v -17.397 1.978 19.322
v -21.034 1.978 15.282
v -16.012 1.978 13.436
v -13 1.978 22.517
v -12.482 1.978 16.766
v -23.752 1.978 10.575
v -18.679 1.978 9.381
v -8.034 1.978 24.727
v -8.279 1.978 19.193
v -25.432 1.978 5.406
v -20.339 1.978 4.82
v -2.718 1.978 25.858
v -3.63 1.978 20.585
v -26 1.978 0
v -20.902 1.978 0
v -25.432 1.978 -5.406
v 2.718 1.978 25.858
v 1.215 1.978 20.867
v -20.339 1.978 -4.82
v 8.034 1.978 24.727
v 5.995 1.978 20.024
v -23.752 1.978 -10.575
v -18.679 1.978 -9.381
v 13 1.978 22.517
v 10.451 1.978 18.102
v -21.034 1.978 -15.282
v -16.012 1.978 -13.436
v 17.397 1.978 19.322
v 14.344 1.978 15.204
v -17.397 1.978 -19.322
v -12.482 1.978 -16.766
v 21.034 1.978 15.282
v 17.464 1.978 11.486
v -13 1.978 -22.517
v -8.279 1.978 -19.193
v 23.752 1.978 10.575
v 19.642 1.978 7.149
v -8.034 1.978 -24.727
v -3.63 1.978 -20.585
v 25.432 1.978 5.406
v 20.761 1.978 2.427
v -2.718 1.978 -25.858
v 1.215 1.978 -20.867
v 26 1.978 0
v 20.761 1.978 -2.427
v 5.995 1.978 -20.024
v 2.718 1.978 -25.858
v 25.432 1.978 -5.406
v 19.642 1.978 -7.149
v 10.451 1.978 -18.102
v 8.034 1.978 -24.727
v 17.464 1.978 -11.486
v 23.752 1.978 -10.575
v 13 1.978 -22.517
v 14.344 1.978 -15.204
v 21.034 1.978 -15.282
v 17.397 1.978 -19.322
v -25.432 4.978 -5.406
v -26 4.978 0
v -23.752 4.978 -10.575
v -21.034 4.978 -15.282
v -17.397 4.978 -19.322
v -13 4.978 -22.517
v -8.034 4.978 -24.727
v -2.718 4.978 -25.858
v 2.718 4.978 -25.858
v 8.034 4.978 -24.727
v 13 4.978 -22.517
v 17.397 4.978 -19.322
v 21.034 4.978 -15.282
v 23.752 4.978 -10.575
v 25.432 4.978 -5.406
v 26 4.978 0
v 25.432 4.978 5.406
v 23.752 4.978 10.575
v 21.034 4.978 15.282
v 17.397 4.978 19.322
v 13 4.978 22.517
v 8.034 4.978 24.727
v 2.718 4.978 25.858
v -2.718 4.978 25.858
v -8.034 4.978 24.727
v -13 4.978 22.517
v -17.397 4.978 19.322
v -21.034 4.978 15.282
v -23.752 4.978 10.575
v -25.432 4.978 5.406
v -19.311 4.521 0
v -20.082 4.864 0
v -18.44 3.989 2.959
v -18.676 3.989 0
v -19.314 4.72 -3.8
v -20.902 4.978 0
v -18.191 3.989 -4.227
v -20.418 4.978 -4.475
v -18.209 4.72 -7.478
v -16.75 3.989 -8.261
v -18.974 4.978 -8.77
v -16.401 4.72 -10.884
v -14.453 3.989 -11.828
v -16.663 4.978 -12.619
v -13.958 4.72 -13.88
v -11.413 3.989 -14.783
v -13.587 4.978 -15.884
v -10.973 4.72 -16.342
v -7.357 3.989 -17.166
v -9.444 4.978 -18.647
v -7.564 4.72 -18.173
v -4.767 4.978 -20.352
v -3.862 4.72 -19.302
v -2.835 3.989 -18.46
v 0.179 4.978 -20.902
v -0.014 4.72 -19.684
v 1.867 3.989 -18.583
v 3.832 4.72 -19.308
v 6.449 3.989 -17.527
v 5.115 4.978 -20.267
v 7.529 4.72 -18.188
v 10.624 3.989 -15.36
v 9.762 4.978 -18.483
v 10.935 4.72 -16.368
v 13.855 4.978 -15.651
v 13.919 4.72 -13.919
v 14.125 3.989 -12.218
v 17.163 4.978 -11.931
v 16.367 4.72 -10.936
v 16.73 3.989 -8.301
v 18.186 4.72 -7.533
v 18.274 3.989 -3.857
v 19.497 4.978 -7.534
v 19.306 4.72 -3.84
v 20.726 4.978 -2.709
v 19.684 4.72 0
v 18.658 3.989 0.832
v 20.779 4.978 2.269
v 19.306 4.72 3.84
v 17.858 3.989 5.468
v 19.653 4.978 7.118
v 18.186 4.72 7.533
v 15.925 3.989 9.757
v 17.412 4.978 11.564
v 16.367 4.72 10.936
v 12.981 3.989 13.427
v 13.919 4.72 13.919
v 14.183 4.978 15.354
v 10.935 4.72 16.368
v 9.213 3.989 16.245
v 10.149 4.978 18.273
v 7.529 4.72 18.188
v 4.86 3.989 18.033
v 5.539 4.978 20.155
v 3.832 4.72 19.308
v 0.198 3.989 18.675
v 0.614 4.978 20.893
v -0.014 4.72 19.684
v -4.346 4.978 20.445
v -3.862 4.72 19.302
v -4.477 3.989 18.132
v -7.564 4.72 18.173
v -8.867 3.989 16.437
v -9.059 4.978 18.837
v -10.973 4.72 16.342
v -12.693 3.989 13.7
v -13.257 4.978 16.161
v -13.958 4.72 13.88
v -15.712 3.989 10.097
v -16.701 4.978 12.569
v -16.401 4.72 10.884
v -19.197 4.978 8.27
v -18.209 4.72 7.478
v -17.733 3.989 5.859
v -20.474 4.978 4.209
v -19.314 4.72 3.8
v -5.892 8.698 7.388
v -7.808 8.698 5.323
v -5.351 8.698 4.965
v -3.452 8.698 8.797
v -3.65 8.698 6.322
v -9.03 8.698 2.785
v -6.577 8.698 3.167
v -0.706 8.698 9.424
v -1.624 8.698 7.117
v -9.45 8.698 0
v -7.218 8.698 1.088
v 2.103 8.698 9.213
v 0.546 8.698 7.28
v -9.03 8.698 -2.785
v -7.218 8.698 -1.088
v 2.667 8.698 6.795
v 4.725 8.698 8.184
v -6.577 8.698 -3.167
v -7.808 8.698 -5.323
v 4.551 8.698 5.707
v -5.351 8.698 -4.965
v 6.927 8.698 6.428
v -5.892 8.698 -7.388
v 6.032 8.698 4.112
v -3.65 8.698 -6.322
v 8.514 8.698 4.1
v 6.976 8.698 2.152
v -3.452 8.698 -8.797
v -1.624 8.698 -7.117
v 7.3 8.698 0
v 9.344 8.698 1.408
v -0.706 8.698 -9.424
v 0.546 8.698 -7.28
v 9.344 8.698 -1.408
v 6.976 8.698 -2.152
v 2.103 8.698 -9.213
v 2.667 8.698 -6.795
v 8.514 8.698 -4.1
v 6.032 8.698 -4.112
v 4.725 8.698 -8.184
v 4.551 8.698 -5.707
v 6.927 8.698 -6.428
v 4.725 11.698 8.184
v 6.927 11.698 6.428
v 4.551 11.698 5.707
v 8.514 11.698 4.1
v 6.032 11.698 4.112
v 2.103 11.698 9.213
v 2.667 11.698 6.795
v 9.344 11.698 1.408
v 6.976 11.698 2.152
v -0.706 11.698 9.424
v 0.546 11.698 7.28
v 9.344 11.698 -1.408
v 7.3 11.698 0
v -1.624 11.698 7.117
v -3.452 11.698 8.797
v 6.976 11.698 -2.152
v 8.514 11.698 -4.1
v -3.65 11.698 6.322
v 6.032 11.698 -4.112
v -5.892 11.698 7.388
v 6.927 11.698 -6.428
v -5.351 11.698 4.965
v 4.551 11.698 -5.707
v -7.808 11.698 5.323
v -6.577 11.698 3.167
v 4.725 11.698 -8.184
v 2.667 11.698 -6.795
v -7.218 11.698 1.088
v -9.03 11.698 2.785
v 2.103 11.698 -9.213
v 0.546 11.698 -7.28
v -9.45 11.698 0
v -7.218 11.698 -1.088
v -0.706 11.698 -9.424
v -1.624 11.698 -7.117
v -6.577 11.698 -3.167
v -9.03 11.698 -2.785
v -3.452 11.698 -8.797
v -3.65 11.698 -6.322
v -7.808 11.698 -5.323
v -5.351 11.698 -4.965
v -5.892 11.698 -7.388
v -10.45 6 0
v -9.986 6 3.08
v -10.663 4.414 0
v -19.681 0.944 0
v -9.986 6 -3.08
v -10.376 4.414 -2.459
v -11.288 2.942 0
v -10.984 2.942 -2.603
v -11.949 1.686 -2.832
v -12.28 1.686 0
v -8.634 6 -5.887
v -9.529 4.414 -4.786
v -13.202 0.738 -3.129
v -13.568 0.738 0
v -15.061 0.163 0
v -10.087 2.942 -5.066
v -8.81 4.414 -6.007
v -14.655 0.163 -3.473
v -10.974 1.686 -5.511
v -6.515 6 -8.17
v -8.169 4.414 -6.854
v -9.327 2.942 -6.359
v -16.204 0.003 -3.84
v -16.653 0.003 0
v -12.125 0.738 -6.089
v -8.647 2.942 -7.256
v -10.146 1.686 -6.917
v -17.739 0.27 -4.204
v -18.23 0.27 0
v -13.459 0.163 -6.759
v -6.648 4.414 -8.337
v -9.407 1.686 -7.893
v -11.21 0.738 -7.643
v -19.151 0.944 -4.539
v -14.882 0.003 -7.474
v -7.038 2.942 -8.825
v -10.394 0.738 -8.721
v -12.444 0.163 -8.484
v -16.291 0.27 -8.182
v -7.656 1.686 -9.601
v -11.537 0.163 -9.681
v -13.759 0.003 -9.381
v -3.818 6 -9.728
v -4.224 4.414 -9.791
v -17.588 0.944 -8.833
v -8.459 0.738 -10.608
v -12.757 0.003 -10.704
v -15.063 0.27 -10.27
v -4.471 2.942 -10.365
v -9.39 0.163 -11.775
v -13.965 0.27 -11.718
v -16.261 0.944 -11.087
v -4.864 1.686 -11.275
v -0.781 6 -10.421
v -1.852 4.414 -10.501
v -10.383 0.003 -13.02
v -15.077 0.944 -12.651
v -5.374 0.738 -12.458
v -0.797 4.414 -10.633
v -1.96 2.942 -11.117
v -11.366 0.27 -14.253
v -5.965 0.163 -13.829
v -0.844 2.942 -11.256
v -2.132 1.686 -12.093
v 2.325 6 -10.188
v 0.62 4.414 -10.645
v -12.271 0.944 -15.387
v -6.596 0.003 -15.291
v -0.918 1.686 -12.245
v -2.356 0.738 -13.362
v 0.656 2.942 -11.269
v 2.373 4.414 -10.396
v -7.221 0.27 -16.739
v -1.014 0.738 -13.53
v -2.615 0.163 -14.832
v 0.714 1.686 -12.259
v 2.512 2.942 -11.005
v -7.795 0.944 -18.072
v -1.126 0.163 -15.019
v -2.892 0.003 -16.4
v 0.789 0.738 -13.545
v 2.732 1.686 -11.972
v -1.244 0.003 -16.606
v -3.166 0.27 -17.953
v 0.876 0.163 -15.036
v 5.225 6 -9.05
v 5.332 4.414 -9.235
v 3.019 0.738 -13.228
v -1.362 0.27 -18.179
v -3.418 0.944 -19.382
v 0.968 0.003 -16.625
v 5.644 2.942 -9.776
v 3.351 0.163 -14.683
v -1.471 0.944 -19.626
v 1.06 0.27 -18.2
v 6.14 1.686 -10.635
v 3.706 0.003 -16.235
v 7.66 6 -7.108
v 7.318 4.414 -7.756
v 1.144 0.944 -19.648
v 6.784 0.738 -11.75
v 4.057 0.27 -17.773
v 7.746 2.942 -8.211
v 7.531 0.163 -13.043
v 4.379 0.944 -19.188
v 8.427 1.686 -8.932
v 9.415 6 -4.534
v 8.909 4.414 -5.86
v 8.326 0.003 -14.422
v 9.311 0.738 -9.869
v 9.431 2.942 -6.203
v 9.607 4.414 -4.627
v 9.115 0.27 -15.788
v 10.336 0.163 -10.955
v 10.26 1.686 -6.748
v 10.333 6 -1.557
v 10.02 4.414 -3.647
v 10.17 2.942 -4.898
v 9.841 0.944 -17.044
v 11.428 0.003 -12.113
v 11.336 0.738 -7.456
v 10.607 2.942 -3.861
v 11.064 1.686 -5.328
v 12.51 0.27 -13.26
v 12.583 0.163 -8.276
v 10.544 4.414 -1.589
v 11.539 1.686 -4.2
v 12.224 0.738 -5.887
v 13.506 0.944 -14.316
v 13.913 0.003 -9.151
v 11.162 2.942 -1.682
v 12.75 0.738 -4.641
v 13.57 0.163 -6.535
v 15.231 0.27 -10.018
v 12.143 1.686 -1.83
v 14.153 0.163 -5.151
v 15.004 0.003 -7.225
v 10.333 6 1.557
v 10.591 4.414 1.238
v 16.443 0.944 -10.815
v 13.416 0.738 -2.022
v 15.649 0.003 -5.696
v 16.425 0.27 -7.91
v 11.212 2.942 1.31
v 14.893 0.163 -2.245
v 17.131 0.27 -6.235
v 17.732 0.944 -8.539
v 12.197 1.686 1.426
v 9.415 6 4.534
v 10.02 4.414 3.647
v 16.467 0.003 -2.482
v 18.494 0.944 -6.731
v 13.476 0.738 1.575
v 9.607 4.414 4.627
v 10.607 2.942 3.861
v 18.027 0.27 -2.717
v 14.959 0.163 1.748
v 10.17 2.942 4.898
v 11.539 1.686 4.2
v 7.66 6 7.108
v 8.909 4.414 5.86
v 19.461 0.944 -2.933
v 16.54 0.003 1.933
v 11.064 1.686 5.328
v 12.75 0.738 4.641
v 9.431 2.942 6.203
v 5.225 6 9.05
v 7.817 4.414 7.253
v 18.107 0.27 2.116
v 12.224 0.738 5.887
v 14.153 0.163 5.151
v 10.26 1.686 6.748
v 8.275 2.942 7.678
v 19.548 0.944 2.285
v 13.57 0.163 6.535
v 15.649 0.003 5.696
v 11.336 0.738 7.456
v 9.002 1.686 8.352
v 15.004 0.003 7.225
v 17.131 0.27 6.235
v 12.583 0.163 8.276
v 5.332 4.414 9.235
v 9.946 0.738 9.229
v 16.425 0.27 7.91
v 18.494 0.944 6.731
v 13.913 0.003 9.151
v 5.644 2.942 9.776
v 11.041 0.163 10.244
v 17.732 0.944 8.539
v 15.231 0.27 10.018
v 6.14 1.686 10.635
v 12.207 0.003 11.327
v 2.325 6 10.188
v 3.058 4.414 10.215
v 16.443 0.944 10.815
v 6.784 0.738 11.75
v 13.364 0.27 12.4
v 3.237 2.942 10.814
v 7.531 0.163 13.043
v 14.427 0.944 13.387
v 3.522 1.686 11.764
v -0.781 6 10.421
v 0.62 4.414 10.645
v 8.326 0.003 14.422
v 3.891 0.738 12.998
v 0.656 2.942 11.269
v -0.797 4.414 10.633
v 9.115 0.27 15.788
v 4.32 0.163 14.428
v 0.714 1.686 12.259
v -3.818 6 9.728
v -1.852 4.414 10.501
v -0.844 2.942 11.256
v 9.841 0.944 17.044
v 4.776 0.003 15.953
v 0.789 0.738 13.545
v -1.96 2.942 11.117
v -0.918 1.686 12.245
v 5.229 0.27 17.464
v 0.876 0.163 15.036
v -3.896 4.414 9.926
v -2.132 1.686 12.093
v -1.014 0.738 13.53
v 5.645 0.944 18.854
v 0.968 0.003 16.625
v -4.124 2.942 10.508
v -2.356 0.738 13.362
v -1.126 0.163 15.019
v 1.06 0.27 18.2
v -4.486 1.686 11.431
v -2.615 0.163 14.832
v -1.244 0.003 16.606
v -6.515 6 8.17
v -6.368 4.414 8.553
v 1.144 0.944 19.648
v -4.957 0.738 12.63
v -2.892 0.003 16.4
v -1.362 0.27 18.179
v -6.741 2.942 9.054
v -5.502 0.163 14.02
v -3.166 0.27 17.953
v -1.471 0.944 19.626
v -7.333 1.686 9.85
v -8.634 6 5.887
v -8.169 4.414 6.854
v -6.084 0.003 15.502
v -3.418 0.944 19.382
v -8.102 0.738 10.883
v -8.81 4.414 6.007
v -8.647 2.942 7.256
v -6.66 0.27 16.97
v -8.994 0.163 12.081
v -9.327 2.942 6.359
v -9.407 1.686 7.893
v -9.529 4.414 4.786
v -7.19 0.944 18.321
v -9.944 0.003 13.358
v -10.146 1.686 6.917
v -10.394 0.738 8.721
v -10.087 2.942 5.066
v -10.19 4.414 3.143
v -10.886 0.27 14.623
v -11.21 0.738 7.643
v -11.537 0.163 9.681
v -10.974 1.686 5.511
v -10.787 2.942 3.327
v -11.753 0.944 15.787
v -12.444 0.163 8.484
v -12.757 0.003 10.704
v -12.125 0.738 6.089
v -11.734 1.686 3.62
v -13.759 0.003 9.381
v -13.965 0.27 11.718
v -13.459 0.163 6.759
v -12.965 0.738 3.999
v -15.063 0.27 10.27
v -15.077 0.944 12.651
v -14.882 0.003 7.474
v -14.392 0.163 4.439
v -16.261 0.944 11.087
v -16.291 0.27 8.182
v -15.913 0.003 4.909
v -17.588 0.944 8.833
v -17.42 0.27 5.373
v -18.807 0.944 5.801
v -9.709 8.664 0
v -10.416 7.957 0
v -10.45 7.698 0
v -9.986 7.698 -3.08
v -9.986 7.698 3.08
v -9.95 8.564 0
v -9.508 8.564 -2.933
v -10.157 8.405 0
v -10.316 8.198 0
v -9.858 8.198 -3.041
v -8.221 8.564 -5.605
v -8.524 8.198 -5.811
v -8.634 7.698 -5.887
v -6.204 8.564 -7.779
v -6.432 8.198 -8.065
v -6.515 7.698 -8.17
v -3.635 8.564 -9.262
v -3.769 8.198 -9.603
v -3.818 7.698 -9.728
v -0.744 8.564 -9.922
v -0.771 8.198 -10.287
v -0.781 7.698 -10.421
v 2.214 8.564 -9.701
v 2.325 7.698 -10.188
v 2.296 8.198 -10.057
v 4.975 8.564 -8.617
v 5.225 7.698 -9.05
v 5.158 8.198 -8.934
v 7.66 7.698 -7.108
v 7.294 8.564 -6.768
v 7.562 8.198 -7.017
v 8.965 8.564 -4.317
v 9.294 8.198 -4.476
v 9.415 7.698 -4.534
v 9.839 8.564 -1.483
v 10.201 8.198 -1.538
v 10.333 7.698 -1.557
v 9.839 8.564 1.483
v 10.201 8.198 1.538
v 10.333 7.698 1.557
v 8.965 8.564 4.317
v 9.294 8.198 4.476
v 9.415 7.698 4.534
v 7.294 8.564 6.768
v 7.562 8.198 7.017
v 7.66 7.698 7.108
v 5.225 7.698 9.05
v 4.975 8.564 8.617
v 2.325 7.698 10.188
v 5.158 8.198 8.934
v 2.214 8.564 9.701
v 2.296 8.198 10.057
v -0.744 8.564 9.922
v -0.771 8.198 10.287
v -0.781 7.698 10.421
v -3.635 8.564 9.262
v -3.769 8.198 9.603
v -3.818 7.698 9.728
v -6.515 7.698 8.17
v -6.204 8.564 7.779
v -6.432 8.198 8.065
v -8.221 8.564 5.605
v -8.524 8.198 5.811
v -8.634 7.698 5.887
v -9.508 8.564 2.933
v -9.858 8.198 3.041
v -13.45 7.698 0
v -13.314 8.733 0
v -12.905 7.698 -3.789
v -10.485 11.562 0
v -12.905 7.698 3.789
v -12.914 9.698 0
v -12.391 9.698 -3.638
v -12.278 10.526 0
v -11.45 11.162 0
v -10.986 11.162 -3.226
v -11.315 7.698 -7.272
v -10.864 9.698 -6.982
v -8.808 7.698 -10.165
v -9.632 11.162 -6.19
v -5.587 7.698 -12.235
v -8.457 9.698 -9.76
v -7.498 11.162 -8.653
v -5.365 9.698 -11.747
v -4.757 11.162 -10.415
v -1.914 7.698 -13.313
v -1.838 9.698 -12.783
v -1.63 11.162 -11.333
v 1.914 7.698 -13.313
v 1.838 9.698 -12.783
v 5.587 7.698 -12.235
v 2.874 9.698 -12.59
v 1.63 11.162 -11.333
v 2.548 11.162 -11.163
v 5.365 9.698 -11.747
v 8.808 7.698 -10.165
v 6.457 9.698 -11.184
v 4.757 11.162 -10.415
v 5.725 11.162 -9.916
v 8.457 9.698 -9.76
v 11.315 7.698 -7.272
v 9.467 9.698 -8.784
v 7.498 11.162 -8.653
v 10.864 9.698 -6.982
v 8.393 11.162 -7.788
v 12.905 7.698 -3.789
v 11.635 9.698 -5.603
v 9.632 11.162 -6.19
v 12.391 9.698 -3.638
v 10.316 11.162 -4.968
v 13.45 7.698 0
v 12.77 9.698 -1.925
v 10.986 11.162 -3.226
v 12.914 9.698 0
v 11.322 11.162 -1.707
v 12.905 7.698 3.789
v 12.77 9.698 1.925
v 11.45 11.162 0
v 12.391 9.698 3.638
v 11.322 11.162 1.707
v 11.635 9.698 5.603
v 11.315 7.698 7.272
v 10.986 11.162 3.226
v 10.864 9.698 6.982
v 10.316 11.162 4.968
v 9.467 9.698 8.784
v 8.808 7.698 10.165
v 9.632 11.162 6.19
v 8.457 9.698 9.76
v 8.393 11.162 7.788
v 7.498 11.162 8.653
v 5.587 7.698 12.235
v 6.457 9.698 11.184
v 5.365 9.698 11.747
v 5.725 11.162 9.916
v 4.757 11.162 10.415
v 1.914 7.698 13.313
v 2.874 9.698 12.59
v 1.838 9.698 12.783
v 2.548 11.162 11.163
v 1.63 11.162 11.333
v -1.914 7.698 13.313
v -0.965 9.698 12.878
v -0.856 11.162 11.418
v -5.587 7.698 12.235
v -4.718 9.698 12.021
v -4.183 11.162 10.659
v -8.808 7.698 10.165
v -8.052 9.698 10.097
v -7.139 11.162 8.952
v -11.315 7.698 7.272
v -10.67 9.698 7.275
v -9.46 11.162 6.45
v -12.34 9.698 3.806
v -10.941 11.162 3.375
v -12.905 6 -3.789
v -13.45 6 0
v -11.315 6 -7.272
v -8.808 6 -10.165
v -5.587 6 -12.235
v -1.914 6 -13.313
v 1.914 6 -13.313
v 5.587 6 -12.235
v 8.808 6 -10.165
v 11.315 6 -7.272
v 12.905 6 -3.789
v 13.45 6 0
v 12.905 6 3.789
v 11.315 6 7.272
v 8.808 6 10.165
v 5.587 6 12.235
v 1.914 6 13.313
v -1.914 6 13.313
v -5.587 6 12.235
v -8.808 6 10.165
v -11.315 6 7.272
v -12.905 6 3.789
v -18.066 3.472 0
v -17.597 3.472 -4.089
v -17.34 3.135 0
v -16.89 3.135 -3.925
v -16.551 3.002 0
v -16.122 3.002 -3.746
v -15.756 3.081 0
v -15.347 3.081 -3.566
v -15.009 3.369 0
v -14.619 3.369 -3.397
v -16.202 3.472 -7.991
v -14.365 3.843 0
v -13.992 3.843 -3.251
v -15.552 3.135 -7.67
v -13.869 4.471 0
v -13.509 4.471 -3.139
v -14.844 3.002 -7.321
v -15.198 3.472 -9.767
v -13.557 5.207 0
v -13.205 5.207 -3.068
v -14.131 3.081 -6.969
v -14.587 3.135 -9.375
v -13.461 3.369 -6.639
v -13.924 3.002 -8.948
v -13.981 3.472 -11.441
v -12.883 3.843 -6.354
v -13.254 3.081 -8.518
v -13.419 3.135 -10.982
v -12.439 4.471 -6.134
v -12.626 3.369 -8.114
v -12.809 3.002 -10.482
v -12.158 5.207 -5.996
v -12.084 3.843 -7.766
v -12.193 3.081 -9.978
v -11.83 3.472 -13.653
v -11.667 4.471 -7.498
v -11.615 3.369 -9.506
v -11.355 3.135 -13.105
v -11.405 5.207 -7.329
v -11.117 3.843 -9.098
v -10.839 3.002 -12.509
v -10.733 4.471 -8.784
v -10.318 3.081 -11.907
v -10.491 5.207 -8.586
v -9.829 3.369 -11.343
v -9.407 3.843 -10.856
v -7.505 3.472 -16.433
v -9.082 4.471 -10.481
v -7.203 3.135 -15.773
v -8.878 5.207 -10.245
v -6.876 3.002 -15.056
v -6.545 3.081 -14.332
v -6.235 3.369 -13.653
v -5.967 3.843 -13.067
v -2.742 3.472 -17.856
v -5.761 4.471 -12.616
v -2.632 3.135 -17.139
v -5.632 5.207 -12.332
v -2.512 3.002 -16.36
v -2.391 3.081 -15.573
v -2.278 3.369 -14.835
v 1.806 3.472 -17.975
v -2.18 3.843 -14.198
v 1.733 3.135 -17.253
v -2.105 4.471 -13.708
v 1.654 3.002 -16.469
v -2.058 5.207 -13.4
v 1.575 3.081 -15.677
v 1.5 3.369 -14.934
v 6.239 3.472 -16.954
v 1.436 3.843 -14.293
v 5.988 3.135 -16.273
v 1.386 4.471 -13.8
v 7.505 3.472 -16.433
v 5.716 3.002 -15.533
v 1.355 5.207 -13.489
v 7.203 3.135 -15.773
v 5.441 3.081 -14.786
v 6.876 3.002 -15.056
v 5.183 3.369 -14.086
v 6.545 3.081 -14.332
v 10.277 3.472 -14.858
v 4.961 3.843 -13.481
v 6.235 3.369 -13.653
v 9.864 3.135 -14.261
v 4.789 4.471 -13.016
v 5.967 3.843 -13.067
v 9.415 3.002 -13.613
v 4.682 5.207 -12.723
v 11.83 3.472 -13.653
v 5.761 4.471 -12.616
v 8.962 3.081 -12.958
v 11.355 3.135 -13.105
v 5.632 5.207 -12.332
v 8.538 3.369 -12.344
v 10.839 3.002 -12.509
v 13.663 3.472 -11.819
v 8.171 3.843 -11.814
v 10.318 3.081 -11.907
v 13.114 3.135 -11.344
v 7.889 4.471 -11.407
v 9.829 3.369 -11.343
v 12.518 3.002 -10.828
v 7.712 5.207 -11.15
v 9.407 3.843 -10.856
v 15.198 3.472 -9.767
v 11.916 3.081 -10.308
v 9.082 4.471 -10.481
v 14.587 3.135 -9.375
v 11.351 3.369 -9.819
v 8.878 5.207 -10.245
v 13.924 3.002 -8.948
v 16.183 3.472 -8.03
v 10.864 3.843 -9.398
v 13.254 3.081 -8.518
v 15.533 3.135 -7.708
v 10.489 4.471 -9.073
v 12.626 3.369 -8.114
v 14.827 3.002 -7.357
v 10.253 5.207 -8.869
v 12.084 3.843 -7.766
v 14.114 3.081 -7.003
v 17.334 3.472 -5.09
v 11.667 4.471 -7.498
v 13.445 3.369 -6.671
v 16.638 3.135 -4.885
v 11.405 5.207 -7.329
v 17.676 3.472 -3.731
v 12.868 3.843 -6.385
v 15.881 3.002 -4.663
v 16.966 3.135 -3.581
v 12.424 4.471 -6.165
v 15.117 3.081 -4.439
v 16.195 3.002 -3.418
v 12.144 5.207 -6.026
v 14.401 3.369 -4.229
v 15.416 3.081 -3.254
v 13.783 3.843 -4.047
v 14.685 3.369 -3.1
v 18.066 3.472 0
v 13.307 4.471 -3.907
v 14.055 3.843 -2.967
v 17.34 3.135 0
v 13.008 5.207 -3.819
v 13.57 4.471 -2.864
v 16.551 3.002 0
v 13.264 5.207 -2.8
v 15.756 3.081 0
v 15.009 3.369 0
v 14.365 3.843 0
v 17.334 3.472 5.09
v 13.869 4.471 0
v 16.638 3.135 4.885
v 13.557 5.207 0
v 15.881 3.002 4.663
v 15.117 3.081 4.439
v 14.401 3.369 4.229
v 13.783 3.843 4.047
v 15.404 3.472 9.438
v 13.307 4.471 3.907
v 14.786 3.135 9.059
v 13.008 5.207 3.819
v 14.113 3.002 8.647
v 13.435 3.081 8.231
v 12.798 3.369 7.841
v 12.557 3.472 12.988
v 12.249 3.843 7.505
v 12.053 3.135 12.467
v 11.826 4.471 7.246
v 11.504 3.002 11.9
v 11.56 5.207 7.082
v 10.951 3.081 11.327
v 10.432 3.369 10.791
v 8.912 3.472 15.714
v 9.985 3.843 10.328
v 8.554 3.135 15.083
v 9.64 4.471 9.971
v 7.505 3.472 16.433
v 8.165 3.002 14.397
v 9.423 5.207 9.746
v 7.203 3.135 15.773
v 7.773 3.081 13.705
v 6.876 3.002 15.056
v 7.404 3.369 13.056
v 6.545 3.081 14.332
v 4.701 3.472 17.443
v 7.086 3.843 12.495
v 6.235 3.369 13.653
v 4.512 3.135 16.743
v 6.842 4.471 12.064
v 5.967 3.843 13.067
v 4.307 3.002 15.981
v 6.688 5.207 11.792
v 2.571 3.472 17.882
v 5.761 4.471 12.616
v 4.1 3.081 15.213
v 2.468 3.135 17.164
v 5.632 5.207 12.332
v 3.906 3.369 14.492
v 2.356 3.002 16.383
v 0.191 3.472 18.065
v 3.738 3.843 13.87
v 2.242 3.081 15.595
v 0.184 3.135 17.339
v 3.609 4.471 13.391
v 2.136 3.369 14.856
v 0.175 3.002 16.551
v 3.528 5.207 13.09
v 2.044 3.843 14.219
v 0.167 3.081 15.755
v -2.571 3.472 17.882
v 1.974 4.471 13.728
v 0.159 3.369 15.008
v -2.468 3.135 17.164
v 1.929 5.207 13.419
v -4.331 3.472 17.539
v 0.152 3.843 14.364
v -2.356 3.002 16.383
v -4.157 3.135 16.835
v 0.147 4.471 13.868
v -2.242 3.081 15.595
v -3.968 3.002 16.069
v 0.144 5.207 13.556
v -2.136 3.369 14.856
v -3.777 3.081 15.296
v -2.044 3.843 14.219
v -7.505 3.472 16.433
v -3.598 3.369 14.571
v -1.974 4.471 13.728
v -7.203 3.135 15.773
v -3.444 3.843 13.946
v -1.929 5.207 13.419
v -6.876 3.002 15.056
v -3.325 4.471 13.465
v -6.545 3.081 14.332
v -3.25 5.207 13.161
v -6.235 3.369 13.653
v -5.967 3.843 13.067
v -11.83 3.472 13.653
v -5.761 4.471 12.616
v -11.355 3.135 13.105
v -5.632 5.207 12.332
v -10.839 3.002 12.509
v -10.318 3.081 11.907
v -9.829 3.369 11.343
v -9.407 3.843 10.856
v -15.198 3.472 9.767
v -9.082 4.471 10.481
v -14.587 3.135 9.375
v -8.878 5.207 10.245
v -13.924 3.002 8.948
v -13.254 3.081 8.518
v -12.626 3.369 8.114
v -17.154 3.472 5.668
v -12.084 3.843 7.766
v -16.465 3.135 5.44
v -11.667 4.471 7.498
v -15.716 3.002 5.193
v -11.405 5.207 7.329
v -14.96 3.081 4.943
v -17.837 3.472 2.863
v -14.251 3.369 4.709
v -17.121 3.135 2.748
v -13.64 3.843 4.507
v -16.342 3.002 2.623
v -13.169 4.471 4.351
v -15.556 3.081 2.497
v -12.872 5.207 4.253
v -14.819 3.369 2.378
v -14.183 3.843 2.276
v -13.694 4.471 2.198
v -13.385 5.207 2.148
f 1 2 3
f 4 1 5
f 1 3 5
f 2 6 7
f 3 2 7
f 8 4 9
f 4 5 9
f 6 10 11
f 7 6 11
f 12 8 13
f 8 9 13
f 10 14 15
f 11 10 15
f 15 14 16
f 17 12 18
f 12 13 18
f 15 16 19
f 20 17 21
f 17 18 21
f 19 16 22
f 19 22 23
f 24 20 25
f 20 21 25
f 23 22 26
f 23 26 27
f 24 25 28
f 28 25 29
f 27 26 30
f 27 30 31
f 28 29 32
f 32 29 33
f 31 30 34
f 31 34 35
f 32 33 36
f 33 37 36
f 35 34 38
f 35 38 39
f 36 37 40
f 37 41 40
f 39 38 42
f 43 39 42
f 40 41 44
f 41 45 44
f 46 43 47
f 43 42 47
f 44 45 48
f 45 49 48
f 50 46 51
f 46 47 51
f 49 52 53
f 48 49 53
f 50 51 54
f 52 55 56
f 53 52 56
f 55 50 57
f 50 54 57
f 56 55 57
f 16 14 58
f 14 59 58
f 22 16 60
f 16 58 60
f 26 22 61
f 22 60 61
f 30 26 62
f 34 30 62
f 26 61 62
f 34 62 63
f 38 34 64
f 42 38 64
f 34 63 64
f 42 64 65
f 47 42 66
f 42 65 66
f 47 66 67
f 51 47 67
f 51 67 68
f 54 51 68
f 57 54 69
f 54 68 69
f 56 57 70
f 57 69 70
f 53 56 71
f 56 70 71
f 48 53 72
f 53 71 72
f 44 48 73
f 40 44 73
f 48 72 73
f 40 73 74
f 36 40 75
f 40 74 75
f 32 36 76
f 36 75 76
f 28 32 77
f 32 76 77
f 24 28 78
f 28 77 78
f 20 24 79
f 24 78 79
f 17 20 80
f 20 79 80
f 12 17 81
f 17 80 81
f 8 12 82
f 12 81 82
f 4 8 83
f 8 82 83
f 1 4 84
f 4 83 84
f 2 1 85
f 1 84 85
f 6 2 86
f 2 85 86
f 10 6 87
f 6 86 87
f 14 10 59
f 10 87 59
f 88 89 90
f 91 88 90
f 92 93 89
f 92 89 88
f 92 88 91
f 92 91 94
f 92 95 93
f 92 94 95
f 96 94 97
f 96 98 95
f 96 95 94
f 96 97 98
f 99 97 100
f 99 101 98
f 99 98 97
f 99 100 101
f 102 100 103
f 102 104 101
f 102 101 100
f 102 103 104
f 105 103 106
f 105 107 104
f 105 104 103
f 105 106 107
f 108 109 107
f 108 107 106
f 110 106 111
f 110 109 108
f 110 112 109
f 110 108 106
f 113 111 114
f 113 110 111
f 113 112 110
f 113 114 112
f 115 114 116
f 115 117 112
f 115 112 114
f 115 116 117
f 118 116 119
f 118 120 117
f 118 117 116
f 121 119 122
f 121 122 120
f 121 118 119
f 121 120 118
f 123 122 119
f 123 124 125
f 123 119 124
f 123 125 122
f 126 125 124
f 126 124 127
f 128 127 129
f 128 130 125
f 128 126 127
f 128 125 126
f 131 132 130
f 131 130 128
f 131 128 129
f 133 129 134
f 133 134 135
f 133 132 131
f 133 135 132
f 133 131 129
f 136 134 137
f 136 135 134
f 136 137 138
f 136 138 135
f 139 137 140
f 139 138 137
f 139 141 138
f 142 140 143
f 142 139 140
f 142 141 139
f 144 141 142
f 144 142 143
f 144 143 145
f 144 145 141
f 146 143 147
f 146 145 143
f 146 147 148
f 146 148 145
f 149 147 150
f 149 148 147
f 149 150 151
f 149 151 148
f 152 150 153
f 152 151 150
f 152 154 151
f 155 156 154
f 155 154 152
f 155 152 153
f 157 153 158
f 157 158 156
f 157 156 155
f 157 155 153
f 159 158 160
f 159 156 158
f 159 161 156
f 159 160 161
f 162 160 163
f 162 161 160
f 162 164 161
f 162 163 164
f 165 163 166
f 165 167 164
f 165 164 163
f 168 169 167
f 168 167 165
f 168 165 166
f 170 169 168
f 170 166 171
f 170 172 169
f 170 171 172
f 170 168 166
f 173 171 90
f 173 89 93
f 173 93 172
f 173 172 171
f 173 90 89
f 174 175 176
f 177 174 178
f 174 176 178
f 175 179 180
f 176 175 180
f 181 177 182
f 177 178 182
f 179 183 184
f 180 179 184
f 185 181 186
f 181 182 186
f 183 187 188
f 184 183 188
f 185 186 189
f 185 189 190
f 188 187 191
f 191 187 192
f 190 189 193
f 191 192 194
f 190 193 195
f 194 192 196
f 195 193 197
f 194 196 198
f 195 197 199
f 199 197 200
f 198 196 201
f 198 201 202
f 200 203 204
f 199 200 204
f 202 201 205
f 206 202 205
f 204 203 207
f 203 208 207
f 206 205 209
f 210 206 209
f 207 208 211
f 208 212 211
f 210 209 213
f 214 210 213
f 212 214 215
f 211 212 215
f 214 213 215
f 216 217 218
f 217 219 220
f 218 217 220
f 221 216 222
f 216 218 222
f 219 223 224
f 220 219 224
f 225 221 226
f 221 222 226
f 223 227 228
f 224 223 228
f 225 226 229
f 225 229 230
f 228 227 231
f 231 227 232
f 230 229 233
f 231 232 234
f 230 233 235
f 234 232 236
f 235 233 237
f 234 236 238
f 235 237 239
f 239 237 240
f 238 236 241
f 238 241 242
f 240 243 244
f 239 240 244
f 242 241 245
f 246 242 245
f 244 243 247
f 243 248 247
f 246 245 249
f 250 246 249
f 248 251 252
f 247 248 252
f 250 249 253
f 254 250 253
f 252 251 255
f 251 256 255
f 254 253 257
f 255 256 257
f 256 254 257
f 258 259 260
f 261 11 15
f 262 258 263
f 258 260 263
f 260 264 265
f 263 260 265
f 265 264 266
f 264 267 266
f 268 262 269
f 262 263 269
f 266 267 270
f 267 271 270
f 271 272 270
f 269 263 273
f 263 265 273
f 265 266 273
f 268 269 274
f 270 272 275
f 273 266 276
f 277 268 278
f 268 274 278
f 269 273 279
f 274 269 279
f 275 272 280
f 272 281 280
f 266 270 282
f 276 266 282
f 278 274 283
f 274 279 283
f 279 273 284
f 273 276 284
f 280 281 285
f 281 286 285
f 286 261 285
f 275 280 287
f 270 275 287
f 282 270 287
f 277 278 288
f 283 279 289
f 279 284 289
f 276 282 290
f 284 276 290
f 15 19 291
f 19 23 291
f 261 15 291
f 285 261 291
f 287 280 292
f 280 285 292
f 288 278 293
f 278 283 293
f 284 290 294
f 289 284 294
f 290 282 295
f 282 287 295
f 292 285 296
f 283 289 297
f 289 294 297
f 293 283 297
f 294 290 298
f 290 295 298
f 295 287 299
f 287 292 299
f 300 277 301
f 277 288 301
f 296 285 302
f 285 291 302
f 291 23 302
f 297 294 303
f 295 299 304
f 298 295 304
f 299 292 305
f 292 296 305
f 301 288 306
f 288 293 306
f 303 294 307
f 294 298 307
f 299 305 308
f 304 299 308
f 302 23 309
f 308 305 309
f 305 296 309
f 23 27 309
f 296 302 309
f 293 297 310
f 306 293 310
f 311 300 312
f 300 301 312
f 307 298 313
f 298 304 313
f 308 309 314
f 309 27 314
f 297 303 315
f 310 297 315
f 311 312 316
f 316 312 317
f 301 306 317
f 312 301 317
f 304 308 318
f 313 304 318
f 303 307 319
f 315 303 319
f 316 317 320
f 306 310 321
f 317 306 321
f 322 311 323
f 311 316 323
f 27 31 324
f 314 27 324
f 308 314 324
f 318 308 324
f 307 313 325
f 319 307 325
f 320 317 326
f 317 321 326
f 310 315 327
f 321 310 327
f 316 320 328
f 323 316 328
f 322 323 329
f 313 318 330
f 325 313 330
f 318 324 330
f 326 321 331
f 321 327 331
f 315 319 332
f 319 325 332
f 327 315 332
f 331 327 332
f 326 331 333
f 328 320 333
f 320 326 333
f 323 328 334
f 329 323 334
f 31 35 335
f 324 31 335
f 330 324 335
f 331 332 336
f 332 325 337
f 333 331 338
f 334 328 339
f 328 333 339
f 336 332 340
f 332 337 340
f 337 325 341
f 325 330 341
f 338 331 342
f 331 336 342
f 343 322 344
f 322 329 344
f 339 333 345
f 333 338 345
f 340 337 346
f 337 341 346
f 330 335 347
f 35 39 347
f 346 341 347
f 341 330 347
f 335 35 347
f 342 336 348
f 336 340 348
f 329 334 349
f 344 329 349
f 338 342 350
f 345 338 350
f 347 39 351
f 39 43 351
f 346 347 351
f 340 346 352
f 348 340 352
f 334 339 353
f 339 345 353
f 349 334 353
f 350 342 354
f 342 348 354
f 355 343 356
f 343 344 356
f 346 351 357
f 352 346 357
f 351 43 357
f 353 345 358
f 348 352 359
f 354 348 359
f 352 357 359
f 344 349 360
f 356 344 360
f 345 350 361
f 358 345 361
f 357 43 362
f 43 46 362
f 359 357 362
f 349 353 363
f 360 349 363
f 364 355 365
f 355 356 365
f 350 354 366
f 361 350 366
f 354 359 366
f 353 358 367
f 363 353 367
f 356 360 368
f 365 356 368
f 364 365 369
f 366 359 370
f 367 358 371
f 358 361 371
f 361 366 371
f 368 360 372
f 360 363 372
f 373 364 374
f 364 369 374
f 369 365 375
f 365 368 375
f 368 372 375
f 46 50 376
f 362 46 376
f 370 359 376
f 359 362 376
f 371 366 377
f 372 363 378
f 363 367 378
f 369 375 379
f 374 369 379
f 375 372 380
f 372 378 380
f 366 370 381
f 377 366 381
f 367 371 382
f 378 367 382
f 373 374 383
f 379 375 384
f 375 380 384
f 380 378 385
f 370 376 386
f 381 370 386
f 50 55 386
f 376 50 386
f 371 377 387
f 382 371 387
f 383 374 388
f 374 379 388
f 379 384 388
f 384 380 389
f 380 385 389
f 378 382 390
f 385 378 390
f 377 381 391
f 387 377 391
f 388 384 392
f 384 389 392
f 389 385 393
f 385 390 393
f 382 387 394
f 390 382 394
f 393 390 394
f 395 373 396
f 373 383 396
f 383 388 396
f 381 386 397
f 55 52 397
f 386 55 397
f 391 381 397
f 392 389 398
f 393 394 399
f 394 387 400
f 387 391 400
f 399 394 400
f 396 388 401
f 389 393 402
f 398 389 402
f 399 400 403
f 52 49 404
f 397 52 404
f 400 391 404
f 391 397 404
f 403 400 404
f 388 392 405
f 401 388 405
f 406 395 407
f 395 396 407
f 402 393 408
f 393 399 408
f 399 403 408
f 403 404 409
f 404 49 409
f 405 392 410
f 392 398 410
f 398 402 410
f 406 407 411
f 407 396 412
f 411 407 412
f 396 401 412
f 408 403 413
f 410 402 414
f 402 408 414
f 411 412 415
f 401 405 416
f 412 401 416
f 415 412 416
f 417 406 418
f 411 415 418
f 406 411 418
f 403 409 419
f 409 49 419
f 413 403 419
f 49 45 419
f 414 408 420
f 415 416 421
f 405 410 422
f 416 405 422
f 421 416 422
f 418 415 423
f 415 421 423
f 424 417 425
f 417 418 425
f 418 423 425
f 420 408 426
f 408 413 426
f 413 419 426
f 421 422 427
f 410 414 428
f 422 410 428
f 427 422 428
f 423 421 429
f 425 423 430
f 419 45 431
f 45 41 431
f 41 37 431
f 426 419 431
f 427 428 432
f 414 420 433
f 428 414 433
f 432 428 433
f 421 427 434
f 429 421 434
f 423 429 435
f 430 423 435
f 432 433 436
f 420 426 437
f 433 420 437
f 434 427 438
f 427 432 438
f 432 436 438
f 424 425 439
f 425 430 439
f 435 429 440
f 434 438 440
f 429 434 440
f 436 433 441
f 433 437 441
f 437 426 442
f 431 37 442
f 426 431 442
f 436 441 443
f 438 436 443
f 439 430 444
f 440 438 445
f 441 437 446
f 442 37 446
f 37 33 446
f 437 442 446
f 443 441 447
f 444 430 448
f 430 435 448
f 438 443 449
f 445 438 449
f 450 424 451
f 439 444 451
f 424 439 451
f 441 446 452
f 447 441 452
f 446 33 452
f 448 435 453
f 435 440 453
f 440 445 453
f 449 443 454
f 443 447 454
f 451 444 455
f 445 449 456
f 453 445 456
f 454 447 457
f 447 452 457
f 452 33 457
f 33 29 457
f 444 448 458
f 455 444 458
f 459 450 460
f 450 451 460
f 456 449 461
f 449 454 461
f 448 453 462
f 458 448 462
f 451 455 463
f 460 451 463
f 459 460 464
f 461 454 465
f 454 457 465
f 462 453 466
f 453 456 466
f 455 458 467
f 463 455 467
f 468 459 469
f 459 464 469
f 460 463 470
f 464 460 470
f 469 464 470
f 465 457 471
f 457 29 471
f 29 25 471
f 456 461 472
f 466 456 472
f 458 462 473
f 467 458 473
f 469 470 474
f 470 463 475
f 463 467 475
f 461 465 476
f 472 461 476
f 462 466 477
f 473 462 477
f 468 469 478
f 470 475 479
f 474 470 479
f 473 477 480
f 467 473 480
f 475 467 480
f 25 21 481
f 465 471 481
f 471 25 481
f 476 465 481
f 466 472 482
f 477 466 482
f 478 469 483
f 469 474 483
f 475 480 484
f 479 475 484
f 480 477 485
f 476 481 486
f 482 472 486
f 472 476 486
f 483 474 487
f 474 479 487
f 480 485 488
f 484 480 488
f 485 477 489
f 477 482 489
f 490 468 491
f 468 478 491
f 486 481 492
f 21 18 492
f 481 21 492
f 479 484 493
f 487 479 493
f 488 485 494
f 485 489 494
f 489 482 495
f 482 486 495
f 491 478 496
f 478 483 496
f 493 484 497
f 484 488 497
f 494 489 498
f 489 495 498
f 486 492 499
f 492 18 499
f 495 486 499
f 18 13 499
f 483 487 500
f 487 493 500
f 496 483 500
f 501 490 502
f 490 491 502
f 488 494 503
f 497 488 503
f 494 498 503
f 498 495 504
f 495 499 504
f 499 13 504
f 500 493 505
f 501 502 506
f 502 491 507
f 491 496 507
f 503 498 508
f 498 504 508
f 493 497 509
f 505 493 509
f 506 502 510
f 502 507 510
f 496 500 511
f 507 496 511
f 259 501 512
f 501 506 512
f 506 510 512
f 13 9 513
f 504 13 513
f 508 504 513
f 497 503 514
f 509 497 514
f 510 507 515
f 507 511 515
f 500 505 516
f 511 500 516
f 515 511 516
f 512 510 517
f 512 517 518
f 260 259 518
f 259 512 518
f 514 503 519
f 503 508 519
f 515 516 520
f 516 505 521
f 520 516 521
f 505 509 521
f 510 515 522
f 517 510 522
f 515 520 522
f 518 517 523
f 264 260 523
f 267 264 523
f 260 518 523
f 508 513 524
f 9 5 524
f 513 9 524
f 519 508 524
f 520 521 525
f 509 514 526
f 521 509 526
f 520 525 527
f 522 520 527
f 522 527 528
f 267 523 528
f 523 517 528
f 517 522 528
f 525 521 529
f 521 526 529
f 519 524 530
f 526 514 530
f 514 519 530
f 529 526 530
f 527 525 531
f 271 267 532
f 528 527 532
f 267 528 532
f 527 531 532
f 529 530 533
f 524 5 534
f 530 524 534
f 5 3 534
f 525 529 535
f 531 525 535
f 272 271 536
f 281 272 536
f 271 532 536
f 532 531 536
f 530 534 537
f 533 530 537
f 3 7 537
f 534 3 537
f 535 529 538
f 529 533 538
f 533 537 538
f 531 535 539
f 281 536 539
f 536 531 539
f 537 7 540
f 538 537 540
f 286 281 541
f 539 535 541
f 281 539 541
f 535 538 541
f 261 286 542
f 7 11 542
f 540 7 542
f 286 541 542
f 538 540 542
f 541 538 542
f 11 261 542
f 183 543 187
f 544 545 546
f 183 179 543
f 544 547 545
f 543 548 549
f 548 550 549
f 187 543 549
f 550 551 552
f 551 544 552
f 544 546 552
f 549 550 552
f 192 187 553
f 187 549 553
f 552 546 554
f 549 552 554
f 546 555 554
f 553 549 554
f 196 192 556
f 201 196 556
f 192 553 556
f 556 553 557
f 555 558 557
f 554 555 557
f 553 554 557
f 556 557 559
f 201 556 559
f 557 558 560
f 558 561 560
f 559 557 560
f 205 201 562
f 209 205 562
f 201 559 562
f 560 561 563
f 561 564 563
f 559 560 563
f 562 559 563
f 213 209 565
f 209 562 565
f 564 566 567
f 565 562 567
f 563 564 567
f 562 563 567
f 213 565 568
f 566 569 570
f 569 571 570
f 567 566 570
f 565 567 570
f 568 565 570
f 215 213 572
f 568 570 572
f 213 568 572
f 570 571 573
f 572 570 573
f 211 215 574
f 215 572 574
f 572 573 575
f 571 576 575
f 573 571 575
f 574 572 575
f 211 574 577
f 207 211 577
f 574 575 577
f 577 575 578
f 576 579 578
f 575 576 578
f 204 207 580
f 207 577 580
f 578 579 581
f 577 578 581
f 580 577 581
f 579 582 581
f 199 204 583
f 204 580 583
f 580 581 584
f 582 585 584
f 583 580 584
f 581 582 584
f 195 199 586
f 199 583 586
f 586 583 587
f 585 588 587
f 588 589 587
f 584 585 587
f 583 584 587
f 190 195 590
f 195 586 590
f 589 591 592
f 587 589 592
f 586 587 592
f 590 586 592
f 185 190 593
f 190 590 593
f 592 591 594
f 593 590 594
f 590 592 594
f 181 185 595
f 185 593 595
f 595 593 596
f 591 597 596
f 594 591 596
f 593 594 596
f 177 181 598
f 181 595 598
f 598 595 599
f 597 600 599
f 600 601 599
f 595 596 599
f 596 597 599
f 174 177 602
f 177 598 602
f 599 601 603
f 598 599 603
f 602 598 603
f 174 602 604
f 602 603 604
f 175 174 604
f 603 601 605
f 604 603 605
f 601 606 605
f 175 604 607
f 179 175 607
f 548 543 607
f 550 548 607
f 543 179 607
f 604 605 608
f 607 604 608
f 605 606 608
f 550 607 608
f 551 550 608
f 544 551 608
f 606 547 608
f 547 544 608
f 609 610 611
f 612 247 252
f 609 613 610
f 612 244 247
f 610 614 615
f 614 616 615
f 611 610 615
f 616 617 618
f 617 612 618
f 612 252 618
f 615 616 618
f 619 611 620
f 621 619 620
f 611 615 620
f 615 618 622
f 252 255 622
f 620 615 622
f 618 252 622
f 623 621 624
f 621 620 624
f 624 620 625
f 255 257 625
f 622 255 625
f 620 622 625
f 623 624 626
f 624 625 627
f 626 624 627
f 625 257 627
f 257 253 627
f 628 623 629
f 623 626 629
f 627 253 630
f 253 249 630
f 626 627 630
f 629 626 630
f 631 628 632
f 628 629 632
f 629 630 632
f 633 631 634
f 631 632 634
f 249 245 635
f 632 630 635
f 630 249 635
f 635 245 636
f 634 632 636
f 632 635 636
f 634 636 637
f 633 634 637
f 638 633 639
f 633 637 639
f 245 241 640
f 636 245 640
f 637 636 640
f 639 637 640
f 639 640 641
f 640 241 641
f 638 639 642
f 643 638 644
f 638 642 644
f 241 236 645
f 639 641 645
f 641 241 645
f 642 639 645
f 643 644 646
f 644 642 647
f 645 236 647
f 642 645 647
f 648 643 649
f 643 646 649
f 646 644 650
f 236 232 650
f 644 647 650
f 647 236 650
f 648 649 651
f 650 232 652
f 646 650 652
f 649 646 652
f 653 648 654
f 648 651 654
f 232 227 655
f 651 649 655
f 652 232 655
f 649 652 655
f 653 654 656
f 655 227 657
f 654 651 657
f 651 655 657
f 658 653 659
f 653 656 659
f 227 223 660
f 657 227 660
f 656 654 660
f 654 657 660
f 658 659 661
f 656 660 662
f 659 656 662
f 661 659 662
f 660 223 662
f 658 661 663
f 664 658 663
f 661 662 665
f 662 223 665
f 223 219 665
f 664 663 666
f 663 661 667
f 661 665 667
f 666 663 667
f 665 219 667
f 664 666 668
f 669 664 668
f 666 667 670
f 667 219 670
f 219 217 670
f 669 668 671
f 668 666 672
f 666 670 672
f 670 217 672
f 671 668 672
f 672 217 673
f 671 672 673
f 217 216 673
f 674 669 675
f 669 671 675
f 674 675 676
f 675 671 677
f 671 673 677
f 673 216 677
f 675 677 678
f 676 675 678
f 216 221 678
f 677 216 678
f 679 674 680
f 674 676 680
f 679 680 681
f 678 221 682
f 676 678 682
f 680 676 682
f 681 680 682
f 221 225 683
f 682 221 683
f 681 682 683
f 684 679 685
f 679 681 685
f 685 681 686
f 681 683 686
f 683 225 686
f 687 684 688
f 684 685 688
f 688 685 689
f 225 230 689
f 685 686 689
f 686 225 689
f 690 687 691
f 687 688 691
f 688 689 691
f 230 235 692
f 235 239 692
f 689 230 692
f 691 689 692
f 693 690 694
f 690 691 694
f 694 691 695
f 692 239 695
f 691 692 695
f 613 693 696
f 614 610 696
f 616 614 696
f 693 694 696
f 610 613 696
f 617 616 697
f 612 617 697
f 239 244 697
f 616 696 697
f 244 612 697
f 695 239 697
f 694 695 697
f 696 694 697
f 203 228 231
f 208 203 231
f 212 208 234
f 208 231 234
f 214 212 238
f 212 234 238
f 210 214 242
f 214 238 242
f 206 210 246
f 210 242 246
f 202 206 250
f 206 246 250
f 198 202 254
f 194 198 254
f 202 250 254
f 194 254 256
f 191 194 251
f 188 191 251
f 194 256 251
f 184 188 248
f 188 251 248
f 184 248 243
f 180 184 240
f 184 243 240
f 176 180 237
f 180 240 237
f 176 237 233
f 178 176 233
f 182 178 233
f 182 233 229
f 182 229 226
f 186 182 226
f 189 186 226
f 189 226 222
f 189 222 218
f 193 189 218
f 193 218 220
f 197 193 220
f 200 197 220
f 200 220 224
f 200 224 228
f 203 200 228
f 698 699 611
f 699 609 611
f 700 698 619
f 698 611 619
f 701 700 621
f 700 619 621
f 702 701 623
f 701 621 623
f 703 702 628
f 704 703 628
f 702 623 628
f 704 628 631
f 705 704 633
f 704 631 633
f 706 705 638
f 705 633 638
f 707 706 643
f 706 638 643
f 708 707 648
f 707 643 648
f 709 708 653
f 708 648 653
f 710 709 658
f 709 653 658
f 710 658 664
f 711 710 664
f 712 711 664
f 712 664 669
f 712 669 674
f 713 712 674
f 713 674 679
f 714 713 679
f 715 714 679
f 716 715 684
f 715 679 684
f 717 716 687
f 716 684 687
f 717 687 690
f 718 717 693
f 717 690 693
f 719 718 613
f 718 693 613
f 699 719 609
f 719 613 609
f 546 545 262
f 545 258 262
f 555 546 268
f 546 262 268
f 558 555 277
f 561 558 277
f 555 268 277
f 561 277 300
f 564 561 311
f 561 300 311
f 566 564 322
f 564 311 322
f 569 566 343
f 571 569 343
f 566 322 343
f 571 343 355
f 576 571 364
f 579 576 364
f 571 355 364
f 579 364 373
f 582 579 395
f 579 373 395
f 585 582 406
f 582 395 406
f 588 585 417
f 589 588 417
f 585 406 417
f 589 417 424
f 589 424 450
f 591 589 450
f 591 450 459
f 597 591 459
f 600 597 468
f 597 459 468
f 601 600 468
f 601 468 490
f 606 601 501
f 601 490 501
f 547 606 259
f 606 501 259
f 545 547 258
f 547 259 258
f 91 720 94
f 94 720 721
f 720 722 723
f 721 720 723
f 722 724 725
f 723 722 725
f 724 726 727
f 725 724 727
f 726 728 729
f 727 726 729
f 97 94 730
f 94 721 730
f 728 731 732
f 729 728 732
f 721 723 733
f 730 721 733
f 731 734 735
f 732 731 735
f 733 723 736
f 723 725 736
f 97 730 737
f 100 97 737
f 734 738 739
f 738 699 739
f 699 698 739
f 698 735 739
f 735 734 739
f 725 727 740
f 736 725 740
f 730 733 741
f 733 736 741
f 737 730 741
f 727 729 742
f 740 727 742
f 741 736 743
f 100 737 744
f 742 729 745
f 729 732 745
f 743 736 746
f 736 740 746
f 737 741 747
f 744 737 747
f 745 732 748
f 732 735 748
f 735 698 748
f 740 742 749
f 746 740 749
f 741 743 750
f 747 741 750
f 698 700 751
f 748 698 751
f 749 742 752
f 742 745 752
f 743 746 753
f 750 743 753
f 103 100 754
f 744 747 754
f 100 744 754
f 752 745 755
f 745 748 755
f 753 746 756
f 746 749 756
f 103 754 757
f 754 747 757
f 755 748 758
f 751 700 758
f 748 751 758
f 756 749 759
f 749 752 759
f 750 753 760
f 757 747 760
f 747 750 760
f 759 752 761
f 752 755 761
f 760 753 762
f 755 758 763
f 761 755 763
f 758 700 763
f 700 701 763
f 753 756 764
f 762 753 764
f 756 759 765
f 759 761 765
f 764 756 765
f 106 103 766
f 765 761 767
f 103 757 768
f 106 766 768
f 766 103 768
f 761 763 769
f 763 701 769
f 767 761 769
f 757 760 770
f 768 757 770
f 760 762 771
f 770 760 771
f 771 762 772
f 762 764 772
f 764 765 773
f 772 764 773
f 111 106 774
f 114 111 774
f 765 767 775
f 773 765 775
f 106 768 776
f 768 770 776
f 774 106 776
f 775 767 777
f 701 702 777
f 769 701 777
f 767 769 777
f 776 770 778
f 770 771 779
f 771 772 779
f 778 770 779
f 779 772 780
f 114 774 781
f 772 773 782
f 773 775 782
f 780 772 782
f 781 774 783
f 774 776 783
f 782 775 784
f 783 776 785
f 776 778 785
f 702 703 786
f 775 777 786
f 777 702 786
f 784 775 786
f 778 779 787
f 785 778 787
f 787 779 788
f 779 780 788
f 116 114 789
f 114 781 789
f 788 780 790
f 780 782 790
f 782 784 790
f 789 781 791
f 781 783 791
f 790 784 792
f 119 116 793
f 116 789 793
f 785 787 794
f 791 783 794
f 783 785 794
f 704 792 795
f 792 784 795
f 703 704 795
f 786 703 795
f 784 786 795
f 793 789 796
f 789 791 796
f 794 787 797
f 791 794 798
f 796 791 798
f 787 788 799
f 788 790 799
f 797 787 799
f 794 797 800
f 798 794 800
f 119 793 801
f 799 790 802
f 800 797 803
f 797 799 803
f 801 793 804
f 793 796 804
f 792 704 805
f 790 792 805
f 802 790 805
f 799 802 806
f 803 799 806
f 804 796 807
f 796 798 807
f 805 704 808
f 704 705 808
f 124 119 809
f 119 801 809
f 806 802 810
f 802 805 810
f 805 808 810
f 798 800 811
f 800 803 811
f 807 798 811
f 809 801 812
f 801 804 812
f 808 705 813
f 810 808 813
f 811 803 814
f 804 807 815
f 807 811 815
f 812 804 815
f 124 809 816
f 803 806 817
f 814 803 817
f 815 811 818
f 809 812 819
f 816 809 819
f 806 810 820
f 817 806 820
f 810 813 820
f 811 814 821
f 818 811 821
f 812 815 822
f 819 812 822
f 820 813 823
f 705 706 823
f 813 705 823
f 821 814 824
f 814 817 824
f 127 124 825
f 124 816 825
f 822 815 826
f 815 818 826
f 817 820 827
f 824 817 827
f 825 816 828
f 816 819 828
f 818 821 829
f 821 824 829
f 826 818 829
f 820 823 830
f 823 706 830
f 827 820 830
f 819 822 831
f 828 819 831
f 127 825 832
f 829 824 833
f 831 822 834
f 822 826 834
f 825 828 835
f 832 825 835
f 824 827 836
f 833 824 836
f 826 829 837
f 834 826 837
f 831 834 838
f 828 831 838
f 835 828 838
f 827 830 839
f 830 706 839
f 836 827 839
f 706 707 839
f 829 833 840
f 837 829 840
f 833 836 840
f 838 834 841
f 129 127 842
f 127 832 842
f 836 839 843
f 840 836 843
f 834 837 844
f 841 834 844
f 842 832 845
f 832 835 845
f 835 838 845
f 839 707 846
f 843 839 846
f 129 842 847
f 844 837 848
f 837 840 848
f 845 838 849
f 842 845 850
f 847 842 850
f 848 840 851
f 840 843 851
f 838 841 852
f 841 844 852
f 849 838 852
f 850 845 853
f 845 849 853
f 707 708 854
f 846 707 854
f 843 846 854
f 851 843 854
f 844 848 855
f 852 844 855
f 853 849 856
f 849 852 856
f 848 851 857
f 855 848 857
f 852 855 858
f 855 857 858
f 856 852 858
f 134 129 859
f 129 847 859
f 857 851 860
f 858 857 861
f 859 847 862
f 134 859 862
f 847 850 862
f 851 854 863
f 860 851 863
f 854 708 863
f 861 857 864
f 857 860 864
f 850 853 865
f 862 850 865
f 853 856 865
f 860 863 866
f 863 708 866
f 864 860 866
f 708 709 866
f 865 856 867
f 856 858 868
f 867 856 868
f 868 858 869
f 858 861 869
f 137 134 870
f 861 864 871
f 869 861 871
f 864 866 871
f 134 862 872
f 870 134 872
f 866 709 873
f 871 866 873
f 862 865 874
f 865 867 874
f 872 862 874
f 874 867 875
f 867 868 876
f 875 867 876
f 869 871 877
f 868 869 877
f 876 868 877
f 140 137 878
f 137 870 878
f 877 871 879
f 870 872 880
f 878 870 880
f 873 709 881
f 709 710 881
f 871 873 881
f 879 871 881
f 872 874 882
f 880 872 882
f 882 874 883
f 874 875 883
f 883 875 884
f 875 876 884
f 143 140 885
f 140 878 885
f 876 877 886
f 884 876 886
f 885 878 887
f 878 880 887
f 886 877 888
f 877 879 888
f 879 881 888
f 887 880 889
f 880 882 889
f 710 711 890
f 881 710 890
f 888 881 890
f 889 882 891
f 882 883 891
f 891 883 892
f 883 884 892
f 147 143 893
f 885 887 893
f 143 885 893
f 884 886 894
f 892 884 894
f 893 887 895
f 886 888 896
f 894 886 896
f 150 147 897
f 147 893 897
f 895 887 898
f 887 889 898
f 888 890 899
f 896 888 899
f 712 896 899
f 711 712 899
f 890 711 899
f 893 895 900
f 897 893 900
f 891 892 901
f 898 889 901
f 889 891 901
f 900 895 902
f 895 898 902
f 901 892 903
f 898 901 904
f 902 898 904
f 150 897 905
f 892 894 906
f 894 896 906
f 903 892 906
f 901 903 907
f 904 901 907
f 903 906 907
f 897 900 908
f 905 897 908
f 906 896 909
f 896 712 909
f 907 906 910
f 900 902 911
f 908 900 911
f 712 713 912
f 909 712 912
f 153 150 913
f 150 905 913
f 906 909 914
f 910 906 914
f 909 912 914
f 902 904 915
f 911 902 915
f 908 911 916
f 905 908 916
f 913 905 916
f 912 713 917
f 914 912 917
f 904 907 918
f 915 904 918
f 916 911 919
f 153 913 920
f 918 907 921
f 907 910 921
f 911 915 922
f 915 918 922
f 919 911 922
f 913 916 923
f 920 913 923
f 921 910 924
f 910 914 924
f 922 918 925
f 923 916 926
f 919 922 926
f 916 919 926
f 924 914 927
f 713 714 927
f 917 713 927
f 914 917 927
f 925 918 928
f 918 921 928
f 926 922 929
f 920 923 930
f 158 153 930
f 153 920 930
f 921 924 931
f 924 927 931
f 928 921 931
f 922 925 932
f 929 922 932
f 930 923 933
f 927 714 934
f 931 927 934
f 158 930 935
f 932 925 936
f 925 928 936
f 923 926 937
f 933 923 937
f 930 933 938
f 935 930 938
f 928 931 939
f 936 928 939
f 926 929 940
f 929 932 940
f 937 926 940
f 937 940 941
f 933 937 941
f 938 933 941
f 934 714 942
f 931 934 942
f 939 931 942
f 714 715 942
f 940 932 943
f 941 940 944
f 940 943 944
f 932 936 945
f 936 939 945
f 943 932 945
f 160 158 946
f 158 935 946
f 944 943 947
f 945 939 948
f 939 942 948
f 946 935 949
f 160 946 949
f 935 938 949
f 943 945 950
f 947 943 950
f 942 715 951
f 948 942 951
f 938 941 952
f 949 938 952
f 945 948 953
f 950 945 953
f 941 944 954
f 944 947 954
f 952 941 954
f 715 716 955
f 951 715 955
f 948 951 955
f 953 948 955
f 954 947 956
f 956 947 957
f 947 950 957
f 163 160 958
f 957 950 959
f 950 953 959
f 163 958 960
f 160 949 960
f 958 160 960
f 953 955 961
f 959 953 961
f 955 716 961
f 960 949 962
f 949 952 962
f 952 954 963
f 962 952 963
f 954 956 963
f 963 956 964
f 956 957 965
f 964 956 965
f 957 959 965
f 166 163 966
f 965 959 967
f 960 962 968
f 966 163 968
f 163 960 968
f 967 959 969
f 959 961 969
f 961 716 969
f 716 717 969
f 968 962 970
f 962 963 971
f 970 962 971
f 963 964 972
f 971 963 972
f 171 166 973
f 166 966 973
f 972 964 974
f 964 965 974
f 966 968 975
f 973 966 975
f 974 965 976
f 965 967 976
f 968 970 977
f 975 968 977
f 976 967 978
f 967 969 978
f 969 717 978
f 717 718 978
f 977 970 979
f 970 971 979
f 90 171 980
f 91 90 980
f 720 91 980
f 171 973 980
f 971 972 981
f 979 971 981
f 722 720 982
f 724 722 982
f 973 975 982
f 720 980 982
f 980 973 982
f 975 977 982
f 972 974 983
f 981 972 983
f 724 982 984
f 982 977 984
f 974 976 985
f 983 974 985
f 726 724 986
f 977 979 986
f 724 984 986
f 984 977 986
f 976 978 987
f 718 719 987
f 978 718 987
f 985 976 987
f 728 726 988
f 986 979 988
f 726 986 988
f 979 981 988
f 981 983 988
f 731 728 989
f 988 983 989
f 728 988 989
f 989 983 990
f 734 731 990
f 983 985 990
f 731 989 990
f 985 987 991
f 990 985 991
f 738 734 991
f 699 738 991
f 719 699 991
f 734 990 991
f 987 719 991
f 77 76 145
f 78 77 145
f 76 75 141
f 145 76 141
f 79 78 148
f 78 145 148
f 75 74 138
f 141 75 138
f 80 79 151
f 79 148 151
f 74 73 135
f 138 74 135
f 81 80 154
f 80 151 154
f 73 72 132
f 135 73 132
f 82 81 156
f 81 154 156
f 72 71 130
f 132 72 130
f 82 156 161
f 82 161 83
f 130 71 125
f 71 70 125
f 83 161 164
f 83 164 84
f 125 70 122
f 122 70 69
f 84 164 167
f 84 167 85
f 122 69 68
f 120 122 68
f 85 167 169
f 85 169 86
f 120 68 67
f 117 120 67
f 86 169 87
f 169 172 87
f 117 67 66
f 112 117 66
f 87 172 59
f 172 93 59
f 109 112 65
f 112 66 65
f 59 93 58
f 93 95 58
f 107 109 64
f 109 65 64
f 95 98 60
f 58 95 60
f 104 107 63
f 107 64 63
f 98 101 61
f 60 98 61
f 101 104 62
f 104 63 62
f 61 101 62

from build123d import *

# Parameters (mm, degrees)
FILLET1_R          = 3
SKETCH2_R          = 7.3
CUT_EXTRUDE1_DEPTH = 12.6980001


with BuildPart() as part:
    # Sketch1 → Revolve1 (revolve)
    with BuildSketch(Plane.XY):
        with BuildLine():
            Line((-26, 4.978), (-19.270552428, 4.978))
            ThreePointArc((-19.270552428, 4.978), (-15.931182732, 3.045202436), (-13.45, 6))
            Line((-13.45, 6), (-13.45, 7.698))
            ThreePointArc((-13.45, 7.698), (-12.278427125, 10.526427125), (-9.45, 11.698))
            Line((-9.45, 11.698), (0, 11.698))
            Line((0, 11.698), (0, 8.698))
            Line((0, 8.698), (-9.45, 8.698))
            ThreePointArc((-9.45, 8.698), (-10.157106781, 8.405106781), (-10.45, 7.698))
            Line((-10.45, 7.698), (-10.45, 6))
            ThreePointArc((-10.45, 6), (-14.295256898, 0.400260527), (-20.902360722, 1.978))
            Line((-20.902360722, 1.978), (-26, 1.978))
            Line((-26, 1.978), (-26, 4.978))
        make_face()
    revolve(axis=Axis((0, 55, 0), (0, -1, 0)))

    # Fillet1
    fillet1_edges = [part.edges().sort_by_distance(p)[0] for p in [
        (19.270552428, 4.978, 0),
    ]]
    fillet(fillet1_edges, radius=FILLET1_R)

    # Sketch2 → Cut-Extrude1 (cut, through all)
    with BuildSketch(Plane(origin=(0, 11.698, 0), x_dir=(1, 0, 0), z_dir=(0, 1, 0))):
        Circle(SKETCH2_R)
    extrude(amount=-CUT_EXTRUDE1_DEPTH, mode=Mode.SUBTRACT)


solid = part.part
